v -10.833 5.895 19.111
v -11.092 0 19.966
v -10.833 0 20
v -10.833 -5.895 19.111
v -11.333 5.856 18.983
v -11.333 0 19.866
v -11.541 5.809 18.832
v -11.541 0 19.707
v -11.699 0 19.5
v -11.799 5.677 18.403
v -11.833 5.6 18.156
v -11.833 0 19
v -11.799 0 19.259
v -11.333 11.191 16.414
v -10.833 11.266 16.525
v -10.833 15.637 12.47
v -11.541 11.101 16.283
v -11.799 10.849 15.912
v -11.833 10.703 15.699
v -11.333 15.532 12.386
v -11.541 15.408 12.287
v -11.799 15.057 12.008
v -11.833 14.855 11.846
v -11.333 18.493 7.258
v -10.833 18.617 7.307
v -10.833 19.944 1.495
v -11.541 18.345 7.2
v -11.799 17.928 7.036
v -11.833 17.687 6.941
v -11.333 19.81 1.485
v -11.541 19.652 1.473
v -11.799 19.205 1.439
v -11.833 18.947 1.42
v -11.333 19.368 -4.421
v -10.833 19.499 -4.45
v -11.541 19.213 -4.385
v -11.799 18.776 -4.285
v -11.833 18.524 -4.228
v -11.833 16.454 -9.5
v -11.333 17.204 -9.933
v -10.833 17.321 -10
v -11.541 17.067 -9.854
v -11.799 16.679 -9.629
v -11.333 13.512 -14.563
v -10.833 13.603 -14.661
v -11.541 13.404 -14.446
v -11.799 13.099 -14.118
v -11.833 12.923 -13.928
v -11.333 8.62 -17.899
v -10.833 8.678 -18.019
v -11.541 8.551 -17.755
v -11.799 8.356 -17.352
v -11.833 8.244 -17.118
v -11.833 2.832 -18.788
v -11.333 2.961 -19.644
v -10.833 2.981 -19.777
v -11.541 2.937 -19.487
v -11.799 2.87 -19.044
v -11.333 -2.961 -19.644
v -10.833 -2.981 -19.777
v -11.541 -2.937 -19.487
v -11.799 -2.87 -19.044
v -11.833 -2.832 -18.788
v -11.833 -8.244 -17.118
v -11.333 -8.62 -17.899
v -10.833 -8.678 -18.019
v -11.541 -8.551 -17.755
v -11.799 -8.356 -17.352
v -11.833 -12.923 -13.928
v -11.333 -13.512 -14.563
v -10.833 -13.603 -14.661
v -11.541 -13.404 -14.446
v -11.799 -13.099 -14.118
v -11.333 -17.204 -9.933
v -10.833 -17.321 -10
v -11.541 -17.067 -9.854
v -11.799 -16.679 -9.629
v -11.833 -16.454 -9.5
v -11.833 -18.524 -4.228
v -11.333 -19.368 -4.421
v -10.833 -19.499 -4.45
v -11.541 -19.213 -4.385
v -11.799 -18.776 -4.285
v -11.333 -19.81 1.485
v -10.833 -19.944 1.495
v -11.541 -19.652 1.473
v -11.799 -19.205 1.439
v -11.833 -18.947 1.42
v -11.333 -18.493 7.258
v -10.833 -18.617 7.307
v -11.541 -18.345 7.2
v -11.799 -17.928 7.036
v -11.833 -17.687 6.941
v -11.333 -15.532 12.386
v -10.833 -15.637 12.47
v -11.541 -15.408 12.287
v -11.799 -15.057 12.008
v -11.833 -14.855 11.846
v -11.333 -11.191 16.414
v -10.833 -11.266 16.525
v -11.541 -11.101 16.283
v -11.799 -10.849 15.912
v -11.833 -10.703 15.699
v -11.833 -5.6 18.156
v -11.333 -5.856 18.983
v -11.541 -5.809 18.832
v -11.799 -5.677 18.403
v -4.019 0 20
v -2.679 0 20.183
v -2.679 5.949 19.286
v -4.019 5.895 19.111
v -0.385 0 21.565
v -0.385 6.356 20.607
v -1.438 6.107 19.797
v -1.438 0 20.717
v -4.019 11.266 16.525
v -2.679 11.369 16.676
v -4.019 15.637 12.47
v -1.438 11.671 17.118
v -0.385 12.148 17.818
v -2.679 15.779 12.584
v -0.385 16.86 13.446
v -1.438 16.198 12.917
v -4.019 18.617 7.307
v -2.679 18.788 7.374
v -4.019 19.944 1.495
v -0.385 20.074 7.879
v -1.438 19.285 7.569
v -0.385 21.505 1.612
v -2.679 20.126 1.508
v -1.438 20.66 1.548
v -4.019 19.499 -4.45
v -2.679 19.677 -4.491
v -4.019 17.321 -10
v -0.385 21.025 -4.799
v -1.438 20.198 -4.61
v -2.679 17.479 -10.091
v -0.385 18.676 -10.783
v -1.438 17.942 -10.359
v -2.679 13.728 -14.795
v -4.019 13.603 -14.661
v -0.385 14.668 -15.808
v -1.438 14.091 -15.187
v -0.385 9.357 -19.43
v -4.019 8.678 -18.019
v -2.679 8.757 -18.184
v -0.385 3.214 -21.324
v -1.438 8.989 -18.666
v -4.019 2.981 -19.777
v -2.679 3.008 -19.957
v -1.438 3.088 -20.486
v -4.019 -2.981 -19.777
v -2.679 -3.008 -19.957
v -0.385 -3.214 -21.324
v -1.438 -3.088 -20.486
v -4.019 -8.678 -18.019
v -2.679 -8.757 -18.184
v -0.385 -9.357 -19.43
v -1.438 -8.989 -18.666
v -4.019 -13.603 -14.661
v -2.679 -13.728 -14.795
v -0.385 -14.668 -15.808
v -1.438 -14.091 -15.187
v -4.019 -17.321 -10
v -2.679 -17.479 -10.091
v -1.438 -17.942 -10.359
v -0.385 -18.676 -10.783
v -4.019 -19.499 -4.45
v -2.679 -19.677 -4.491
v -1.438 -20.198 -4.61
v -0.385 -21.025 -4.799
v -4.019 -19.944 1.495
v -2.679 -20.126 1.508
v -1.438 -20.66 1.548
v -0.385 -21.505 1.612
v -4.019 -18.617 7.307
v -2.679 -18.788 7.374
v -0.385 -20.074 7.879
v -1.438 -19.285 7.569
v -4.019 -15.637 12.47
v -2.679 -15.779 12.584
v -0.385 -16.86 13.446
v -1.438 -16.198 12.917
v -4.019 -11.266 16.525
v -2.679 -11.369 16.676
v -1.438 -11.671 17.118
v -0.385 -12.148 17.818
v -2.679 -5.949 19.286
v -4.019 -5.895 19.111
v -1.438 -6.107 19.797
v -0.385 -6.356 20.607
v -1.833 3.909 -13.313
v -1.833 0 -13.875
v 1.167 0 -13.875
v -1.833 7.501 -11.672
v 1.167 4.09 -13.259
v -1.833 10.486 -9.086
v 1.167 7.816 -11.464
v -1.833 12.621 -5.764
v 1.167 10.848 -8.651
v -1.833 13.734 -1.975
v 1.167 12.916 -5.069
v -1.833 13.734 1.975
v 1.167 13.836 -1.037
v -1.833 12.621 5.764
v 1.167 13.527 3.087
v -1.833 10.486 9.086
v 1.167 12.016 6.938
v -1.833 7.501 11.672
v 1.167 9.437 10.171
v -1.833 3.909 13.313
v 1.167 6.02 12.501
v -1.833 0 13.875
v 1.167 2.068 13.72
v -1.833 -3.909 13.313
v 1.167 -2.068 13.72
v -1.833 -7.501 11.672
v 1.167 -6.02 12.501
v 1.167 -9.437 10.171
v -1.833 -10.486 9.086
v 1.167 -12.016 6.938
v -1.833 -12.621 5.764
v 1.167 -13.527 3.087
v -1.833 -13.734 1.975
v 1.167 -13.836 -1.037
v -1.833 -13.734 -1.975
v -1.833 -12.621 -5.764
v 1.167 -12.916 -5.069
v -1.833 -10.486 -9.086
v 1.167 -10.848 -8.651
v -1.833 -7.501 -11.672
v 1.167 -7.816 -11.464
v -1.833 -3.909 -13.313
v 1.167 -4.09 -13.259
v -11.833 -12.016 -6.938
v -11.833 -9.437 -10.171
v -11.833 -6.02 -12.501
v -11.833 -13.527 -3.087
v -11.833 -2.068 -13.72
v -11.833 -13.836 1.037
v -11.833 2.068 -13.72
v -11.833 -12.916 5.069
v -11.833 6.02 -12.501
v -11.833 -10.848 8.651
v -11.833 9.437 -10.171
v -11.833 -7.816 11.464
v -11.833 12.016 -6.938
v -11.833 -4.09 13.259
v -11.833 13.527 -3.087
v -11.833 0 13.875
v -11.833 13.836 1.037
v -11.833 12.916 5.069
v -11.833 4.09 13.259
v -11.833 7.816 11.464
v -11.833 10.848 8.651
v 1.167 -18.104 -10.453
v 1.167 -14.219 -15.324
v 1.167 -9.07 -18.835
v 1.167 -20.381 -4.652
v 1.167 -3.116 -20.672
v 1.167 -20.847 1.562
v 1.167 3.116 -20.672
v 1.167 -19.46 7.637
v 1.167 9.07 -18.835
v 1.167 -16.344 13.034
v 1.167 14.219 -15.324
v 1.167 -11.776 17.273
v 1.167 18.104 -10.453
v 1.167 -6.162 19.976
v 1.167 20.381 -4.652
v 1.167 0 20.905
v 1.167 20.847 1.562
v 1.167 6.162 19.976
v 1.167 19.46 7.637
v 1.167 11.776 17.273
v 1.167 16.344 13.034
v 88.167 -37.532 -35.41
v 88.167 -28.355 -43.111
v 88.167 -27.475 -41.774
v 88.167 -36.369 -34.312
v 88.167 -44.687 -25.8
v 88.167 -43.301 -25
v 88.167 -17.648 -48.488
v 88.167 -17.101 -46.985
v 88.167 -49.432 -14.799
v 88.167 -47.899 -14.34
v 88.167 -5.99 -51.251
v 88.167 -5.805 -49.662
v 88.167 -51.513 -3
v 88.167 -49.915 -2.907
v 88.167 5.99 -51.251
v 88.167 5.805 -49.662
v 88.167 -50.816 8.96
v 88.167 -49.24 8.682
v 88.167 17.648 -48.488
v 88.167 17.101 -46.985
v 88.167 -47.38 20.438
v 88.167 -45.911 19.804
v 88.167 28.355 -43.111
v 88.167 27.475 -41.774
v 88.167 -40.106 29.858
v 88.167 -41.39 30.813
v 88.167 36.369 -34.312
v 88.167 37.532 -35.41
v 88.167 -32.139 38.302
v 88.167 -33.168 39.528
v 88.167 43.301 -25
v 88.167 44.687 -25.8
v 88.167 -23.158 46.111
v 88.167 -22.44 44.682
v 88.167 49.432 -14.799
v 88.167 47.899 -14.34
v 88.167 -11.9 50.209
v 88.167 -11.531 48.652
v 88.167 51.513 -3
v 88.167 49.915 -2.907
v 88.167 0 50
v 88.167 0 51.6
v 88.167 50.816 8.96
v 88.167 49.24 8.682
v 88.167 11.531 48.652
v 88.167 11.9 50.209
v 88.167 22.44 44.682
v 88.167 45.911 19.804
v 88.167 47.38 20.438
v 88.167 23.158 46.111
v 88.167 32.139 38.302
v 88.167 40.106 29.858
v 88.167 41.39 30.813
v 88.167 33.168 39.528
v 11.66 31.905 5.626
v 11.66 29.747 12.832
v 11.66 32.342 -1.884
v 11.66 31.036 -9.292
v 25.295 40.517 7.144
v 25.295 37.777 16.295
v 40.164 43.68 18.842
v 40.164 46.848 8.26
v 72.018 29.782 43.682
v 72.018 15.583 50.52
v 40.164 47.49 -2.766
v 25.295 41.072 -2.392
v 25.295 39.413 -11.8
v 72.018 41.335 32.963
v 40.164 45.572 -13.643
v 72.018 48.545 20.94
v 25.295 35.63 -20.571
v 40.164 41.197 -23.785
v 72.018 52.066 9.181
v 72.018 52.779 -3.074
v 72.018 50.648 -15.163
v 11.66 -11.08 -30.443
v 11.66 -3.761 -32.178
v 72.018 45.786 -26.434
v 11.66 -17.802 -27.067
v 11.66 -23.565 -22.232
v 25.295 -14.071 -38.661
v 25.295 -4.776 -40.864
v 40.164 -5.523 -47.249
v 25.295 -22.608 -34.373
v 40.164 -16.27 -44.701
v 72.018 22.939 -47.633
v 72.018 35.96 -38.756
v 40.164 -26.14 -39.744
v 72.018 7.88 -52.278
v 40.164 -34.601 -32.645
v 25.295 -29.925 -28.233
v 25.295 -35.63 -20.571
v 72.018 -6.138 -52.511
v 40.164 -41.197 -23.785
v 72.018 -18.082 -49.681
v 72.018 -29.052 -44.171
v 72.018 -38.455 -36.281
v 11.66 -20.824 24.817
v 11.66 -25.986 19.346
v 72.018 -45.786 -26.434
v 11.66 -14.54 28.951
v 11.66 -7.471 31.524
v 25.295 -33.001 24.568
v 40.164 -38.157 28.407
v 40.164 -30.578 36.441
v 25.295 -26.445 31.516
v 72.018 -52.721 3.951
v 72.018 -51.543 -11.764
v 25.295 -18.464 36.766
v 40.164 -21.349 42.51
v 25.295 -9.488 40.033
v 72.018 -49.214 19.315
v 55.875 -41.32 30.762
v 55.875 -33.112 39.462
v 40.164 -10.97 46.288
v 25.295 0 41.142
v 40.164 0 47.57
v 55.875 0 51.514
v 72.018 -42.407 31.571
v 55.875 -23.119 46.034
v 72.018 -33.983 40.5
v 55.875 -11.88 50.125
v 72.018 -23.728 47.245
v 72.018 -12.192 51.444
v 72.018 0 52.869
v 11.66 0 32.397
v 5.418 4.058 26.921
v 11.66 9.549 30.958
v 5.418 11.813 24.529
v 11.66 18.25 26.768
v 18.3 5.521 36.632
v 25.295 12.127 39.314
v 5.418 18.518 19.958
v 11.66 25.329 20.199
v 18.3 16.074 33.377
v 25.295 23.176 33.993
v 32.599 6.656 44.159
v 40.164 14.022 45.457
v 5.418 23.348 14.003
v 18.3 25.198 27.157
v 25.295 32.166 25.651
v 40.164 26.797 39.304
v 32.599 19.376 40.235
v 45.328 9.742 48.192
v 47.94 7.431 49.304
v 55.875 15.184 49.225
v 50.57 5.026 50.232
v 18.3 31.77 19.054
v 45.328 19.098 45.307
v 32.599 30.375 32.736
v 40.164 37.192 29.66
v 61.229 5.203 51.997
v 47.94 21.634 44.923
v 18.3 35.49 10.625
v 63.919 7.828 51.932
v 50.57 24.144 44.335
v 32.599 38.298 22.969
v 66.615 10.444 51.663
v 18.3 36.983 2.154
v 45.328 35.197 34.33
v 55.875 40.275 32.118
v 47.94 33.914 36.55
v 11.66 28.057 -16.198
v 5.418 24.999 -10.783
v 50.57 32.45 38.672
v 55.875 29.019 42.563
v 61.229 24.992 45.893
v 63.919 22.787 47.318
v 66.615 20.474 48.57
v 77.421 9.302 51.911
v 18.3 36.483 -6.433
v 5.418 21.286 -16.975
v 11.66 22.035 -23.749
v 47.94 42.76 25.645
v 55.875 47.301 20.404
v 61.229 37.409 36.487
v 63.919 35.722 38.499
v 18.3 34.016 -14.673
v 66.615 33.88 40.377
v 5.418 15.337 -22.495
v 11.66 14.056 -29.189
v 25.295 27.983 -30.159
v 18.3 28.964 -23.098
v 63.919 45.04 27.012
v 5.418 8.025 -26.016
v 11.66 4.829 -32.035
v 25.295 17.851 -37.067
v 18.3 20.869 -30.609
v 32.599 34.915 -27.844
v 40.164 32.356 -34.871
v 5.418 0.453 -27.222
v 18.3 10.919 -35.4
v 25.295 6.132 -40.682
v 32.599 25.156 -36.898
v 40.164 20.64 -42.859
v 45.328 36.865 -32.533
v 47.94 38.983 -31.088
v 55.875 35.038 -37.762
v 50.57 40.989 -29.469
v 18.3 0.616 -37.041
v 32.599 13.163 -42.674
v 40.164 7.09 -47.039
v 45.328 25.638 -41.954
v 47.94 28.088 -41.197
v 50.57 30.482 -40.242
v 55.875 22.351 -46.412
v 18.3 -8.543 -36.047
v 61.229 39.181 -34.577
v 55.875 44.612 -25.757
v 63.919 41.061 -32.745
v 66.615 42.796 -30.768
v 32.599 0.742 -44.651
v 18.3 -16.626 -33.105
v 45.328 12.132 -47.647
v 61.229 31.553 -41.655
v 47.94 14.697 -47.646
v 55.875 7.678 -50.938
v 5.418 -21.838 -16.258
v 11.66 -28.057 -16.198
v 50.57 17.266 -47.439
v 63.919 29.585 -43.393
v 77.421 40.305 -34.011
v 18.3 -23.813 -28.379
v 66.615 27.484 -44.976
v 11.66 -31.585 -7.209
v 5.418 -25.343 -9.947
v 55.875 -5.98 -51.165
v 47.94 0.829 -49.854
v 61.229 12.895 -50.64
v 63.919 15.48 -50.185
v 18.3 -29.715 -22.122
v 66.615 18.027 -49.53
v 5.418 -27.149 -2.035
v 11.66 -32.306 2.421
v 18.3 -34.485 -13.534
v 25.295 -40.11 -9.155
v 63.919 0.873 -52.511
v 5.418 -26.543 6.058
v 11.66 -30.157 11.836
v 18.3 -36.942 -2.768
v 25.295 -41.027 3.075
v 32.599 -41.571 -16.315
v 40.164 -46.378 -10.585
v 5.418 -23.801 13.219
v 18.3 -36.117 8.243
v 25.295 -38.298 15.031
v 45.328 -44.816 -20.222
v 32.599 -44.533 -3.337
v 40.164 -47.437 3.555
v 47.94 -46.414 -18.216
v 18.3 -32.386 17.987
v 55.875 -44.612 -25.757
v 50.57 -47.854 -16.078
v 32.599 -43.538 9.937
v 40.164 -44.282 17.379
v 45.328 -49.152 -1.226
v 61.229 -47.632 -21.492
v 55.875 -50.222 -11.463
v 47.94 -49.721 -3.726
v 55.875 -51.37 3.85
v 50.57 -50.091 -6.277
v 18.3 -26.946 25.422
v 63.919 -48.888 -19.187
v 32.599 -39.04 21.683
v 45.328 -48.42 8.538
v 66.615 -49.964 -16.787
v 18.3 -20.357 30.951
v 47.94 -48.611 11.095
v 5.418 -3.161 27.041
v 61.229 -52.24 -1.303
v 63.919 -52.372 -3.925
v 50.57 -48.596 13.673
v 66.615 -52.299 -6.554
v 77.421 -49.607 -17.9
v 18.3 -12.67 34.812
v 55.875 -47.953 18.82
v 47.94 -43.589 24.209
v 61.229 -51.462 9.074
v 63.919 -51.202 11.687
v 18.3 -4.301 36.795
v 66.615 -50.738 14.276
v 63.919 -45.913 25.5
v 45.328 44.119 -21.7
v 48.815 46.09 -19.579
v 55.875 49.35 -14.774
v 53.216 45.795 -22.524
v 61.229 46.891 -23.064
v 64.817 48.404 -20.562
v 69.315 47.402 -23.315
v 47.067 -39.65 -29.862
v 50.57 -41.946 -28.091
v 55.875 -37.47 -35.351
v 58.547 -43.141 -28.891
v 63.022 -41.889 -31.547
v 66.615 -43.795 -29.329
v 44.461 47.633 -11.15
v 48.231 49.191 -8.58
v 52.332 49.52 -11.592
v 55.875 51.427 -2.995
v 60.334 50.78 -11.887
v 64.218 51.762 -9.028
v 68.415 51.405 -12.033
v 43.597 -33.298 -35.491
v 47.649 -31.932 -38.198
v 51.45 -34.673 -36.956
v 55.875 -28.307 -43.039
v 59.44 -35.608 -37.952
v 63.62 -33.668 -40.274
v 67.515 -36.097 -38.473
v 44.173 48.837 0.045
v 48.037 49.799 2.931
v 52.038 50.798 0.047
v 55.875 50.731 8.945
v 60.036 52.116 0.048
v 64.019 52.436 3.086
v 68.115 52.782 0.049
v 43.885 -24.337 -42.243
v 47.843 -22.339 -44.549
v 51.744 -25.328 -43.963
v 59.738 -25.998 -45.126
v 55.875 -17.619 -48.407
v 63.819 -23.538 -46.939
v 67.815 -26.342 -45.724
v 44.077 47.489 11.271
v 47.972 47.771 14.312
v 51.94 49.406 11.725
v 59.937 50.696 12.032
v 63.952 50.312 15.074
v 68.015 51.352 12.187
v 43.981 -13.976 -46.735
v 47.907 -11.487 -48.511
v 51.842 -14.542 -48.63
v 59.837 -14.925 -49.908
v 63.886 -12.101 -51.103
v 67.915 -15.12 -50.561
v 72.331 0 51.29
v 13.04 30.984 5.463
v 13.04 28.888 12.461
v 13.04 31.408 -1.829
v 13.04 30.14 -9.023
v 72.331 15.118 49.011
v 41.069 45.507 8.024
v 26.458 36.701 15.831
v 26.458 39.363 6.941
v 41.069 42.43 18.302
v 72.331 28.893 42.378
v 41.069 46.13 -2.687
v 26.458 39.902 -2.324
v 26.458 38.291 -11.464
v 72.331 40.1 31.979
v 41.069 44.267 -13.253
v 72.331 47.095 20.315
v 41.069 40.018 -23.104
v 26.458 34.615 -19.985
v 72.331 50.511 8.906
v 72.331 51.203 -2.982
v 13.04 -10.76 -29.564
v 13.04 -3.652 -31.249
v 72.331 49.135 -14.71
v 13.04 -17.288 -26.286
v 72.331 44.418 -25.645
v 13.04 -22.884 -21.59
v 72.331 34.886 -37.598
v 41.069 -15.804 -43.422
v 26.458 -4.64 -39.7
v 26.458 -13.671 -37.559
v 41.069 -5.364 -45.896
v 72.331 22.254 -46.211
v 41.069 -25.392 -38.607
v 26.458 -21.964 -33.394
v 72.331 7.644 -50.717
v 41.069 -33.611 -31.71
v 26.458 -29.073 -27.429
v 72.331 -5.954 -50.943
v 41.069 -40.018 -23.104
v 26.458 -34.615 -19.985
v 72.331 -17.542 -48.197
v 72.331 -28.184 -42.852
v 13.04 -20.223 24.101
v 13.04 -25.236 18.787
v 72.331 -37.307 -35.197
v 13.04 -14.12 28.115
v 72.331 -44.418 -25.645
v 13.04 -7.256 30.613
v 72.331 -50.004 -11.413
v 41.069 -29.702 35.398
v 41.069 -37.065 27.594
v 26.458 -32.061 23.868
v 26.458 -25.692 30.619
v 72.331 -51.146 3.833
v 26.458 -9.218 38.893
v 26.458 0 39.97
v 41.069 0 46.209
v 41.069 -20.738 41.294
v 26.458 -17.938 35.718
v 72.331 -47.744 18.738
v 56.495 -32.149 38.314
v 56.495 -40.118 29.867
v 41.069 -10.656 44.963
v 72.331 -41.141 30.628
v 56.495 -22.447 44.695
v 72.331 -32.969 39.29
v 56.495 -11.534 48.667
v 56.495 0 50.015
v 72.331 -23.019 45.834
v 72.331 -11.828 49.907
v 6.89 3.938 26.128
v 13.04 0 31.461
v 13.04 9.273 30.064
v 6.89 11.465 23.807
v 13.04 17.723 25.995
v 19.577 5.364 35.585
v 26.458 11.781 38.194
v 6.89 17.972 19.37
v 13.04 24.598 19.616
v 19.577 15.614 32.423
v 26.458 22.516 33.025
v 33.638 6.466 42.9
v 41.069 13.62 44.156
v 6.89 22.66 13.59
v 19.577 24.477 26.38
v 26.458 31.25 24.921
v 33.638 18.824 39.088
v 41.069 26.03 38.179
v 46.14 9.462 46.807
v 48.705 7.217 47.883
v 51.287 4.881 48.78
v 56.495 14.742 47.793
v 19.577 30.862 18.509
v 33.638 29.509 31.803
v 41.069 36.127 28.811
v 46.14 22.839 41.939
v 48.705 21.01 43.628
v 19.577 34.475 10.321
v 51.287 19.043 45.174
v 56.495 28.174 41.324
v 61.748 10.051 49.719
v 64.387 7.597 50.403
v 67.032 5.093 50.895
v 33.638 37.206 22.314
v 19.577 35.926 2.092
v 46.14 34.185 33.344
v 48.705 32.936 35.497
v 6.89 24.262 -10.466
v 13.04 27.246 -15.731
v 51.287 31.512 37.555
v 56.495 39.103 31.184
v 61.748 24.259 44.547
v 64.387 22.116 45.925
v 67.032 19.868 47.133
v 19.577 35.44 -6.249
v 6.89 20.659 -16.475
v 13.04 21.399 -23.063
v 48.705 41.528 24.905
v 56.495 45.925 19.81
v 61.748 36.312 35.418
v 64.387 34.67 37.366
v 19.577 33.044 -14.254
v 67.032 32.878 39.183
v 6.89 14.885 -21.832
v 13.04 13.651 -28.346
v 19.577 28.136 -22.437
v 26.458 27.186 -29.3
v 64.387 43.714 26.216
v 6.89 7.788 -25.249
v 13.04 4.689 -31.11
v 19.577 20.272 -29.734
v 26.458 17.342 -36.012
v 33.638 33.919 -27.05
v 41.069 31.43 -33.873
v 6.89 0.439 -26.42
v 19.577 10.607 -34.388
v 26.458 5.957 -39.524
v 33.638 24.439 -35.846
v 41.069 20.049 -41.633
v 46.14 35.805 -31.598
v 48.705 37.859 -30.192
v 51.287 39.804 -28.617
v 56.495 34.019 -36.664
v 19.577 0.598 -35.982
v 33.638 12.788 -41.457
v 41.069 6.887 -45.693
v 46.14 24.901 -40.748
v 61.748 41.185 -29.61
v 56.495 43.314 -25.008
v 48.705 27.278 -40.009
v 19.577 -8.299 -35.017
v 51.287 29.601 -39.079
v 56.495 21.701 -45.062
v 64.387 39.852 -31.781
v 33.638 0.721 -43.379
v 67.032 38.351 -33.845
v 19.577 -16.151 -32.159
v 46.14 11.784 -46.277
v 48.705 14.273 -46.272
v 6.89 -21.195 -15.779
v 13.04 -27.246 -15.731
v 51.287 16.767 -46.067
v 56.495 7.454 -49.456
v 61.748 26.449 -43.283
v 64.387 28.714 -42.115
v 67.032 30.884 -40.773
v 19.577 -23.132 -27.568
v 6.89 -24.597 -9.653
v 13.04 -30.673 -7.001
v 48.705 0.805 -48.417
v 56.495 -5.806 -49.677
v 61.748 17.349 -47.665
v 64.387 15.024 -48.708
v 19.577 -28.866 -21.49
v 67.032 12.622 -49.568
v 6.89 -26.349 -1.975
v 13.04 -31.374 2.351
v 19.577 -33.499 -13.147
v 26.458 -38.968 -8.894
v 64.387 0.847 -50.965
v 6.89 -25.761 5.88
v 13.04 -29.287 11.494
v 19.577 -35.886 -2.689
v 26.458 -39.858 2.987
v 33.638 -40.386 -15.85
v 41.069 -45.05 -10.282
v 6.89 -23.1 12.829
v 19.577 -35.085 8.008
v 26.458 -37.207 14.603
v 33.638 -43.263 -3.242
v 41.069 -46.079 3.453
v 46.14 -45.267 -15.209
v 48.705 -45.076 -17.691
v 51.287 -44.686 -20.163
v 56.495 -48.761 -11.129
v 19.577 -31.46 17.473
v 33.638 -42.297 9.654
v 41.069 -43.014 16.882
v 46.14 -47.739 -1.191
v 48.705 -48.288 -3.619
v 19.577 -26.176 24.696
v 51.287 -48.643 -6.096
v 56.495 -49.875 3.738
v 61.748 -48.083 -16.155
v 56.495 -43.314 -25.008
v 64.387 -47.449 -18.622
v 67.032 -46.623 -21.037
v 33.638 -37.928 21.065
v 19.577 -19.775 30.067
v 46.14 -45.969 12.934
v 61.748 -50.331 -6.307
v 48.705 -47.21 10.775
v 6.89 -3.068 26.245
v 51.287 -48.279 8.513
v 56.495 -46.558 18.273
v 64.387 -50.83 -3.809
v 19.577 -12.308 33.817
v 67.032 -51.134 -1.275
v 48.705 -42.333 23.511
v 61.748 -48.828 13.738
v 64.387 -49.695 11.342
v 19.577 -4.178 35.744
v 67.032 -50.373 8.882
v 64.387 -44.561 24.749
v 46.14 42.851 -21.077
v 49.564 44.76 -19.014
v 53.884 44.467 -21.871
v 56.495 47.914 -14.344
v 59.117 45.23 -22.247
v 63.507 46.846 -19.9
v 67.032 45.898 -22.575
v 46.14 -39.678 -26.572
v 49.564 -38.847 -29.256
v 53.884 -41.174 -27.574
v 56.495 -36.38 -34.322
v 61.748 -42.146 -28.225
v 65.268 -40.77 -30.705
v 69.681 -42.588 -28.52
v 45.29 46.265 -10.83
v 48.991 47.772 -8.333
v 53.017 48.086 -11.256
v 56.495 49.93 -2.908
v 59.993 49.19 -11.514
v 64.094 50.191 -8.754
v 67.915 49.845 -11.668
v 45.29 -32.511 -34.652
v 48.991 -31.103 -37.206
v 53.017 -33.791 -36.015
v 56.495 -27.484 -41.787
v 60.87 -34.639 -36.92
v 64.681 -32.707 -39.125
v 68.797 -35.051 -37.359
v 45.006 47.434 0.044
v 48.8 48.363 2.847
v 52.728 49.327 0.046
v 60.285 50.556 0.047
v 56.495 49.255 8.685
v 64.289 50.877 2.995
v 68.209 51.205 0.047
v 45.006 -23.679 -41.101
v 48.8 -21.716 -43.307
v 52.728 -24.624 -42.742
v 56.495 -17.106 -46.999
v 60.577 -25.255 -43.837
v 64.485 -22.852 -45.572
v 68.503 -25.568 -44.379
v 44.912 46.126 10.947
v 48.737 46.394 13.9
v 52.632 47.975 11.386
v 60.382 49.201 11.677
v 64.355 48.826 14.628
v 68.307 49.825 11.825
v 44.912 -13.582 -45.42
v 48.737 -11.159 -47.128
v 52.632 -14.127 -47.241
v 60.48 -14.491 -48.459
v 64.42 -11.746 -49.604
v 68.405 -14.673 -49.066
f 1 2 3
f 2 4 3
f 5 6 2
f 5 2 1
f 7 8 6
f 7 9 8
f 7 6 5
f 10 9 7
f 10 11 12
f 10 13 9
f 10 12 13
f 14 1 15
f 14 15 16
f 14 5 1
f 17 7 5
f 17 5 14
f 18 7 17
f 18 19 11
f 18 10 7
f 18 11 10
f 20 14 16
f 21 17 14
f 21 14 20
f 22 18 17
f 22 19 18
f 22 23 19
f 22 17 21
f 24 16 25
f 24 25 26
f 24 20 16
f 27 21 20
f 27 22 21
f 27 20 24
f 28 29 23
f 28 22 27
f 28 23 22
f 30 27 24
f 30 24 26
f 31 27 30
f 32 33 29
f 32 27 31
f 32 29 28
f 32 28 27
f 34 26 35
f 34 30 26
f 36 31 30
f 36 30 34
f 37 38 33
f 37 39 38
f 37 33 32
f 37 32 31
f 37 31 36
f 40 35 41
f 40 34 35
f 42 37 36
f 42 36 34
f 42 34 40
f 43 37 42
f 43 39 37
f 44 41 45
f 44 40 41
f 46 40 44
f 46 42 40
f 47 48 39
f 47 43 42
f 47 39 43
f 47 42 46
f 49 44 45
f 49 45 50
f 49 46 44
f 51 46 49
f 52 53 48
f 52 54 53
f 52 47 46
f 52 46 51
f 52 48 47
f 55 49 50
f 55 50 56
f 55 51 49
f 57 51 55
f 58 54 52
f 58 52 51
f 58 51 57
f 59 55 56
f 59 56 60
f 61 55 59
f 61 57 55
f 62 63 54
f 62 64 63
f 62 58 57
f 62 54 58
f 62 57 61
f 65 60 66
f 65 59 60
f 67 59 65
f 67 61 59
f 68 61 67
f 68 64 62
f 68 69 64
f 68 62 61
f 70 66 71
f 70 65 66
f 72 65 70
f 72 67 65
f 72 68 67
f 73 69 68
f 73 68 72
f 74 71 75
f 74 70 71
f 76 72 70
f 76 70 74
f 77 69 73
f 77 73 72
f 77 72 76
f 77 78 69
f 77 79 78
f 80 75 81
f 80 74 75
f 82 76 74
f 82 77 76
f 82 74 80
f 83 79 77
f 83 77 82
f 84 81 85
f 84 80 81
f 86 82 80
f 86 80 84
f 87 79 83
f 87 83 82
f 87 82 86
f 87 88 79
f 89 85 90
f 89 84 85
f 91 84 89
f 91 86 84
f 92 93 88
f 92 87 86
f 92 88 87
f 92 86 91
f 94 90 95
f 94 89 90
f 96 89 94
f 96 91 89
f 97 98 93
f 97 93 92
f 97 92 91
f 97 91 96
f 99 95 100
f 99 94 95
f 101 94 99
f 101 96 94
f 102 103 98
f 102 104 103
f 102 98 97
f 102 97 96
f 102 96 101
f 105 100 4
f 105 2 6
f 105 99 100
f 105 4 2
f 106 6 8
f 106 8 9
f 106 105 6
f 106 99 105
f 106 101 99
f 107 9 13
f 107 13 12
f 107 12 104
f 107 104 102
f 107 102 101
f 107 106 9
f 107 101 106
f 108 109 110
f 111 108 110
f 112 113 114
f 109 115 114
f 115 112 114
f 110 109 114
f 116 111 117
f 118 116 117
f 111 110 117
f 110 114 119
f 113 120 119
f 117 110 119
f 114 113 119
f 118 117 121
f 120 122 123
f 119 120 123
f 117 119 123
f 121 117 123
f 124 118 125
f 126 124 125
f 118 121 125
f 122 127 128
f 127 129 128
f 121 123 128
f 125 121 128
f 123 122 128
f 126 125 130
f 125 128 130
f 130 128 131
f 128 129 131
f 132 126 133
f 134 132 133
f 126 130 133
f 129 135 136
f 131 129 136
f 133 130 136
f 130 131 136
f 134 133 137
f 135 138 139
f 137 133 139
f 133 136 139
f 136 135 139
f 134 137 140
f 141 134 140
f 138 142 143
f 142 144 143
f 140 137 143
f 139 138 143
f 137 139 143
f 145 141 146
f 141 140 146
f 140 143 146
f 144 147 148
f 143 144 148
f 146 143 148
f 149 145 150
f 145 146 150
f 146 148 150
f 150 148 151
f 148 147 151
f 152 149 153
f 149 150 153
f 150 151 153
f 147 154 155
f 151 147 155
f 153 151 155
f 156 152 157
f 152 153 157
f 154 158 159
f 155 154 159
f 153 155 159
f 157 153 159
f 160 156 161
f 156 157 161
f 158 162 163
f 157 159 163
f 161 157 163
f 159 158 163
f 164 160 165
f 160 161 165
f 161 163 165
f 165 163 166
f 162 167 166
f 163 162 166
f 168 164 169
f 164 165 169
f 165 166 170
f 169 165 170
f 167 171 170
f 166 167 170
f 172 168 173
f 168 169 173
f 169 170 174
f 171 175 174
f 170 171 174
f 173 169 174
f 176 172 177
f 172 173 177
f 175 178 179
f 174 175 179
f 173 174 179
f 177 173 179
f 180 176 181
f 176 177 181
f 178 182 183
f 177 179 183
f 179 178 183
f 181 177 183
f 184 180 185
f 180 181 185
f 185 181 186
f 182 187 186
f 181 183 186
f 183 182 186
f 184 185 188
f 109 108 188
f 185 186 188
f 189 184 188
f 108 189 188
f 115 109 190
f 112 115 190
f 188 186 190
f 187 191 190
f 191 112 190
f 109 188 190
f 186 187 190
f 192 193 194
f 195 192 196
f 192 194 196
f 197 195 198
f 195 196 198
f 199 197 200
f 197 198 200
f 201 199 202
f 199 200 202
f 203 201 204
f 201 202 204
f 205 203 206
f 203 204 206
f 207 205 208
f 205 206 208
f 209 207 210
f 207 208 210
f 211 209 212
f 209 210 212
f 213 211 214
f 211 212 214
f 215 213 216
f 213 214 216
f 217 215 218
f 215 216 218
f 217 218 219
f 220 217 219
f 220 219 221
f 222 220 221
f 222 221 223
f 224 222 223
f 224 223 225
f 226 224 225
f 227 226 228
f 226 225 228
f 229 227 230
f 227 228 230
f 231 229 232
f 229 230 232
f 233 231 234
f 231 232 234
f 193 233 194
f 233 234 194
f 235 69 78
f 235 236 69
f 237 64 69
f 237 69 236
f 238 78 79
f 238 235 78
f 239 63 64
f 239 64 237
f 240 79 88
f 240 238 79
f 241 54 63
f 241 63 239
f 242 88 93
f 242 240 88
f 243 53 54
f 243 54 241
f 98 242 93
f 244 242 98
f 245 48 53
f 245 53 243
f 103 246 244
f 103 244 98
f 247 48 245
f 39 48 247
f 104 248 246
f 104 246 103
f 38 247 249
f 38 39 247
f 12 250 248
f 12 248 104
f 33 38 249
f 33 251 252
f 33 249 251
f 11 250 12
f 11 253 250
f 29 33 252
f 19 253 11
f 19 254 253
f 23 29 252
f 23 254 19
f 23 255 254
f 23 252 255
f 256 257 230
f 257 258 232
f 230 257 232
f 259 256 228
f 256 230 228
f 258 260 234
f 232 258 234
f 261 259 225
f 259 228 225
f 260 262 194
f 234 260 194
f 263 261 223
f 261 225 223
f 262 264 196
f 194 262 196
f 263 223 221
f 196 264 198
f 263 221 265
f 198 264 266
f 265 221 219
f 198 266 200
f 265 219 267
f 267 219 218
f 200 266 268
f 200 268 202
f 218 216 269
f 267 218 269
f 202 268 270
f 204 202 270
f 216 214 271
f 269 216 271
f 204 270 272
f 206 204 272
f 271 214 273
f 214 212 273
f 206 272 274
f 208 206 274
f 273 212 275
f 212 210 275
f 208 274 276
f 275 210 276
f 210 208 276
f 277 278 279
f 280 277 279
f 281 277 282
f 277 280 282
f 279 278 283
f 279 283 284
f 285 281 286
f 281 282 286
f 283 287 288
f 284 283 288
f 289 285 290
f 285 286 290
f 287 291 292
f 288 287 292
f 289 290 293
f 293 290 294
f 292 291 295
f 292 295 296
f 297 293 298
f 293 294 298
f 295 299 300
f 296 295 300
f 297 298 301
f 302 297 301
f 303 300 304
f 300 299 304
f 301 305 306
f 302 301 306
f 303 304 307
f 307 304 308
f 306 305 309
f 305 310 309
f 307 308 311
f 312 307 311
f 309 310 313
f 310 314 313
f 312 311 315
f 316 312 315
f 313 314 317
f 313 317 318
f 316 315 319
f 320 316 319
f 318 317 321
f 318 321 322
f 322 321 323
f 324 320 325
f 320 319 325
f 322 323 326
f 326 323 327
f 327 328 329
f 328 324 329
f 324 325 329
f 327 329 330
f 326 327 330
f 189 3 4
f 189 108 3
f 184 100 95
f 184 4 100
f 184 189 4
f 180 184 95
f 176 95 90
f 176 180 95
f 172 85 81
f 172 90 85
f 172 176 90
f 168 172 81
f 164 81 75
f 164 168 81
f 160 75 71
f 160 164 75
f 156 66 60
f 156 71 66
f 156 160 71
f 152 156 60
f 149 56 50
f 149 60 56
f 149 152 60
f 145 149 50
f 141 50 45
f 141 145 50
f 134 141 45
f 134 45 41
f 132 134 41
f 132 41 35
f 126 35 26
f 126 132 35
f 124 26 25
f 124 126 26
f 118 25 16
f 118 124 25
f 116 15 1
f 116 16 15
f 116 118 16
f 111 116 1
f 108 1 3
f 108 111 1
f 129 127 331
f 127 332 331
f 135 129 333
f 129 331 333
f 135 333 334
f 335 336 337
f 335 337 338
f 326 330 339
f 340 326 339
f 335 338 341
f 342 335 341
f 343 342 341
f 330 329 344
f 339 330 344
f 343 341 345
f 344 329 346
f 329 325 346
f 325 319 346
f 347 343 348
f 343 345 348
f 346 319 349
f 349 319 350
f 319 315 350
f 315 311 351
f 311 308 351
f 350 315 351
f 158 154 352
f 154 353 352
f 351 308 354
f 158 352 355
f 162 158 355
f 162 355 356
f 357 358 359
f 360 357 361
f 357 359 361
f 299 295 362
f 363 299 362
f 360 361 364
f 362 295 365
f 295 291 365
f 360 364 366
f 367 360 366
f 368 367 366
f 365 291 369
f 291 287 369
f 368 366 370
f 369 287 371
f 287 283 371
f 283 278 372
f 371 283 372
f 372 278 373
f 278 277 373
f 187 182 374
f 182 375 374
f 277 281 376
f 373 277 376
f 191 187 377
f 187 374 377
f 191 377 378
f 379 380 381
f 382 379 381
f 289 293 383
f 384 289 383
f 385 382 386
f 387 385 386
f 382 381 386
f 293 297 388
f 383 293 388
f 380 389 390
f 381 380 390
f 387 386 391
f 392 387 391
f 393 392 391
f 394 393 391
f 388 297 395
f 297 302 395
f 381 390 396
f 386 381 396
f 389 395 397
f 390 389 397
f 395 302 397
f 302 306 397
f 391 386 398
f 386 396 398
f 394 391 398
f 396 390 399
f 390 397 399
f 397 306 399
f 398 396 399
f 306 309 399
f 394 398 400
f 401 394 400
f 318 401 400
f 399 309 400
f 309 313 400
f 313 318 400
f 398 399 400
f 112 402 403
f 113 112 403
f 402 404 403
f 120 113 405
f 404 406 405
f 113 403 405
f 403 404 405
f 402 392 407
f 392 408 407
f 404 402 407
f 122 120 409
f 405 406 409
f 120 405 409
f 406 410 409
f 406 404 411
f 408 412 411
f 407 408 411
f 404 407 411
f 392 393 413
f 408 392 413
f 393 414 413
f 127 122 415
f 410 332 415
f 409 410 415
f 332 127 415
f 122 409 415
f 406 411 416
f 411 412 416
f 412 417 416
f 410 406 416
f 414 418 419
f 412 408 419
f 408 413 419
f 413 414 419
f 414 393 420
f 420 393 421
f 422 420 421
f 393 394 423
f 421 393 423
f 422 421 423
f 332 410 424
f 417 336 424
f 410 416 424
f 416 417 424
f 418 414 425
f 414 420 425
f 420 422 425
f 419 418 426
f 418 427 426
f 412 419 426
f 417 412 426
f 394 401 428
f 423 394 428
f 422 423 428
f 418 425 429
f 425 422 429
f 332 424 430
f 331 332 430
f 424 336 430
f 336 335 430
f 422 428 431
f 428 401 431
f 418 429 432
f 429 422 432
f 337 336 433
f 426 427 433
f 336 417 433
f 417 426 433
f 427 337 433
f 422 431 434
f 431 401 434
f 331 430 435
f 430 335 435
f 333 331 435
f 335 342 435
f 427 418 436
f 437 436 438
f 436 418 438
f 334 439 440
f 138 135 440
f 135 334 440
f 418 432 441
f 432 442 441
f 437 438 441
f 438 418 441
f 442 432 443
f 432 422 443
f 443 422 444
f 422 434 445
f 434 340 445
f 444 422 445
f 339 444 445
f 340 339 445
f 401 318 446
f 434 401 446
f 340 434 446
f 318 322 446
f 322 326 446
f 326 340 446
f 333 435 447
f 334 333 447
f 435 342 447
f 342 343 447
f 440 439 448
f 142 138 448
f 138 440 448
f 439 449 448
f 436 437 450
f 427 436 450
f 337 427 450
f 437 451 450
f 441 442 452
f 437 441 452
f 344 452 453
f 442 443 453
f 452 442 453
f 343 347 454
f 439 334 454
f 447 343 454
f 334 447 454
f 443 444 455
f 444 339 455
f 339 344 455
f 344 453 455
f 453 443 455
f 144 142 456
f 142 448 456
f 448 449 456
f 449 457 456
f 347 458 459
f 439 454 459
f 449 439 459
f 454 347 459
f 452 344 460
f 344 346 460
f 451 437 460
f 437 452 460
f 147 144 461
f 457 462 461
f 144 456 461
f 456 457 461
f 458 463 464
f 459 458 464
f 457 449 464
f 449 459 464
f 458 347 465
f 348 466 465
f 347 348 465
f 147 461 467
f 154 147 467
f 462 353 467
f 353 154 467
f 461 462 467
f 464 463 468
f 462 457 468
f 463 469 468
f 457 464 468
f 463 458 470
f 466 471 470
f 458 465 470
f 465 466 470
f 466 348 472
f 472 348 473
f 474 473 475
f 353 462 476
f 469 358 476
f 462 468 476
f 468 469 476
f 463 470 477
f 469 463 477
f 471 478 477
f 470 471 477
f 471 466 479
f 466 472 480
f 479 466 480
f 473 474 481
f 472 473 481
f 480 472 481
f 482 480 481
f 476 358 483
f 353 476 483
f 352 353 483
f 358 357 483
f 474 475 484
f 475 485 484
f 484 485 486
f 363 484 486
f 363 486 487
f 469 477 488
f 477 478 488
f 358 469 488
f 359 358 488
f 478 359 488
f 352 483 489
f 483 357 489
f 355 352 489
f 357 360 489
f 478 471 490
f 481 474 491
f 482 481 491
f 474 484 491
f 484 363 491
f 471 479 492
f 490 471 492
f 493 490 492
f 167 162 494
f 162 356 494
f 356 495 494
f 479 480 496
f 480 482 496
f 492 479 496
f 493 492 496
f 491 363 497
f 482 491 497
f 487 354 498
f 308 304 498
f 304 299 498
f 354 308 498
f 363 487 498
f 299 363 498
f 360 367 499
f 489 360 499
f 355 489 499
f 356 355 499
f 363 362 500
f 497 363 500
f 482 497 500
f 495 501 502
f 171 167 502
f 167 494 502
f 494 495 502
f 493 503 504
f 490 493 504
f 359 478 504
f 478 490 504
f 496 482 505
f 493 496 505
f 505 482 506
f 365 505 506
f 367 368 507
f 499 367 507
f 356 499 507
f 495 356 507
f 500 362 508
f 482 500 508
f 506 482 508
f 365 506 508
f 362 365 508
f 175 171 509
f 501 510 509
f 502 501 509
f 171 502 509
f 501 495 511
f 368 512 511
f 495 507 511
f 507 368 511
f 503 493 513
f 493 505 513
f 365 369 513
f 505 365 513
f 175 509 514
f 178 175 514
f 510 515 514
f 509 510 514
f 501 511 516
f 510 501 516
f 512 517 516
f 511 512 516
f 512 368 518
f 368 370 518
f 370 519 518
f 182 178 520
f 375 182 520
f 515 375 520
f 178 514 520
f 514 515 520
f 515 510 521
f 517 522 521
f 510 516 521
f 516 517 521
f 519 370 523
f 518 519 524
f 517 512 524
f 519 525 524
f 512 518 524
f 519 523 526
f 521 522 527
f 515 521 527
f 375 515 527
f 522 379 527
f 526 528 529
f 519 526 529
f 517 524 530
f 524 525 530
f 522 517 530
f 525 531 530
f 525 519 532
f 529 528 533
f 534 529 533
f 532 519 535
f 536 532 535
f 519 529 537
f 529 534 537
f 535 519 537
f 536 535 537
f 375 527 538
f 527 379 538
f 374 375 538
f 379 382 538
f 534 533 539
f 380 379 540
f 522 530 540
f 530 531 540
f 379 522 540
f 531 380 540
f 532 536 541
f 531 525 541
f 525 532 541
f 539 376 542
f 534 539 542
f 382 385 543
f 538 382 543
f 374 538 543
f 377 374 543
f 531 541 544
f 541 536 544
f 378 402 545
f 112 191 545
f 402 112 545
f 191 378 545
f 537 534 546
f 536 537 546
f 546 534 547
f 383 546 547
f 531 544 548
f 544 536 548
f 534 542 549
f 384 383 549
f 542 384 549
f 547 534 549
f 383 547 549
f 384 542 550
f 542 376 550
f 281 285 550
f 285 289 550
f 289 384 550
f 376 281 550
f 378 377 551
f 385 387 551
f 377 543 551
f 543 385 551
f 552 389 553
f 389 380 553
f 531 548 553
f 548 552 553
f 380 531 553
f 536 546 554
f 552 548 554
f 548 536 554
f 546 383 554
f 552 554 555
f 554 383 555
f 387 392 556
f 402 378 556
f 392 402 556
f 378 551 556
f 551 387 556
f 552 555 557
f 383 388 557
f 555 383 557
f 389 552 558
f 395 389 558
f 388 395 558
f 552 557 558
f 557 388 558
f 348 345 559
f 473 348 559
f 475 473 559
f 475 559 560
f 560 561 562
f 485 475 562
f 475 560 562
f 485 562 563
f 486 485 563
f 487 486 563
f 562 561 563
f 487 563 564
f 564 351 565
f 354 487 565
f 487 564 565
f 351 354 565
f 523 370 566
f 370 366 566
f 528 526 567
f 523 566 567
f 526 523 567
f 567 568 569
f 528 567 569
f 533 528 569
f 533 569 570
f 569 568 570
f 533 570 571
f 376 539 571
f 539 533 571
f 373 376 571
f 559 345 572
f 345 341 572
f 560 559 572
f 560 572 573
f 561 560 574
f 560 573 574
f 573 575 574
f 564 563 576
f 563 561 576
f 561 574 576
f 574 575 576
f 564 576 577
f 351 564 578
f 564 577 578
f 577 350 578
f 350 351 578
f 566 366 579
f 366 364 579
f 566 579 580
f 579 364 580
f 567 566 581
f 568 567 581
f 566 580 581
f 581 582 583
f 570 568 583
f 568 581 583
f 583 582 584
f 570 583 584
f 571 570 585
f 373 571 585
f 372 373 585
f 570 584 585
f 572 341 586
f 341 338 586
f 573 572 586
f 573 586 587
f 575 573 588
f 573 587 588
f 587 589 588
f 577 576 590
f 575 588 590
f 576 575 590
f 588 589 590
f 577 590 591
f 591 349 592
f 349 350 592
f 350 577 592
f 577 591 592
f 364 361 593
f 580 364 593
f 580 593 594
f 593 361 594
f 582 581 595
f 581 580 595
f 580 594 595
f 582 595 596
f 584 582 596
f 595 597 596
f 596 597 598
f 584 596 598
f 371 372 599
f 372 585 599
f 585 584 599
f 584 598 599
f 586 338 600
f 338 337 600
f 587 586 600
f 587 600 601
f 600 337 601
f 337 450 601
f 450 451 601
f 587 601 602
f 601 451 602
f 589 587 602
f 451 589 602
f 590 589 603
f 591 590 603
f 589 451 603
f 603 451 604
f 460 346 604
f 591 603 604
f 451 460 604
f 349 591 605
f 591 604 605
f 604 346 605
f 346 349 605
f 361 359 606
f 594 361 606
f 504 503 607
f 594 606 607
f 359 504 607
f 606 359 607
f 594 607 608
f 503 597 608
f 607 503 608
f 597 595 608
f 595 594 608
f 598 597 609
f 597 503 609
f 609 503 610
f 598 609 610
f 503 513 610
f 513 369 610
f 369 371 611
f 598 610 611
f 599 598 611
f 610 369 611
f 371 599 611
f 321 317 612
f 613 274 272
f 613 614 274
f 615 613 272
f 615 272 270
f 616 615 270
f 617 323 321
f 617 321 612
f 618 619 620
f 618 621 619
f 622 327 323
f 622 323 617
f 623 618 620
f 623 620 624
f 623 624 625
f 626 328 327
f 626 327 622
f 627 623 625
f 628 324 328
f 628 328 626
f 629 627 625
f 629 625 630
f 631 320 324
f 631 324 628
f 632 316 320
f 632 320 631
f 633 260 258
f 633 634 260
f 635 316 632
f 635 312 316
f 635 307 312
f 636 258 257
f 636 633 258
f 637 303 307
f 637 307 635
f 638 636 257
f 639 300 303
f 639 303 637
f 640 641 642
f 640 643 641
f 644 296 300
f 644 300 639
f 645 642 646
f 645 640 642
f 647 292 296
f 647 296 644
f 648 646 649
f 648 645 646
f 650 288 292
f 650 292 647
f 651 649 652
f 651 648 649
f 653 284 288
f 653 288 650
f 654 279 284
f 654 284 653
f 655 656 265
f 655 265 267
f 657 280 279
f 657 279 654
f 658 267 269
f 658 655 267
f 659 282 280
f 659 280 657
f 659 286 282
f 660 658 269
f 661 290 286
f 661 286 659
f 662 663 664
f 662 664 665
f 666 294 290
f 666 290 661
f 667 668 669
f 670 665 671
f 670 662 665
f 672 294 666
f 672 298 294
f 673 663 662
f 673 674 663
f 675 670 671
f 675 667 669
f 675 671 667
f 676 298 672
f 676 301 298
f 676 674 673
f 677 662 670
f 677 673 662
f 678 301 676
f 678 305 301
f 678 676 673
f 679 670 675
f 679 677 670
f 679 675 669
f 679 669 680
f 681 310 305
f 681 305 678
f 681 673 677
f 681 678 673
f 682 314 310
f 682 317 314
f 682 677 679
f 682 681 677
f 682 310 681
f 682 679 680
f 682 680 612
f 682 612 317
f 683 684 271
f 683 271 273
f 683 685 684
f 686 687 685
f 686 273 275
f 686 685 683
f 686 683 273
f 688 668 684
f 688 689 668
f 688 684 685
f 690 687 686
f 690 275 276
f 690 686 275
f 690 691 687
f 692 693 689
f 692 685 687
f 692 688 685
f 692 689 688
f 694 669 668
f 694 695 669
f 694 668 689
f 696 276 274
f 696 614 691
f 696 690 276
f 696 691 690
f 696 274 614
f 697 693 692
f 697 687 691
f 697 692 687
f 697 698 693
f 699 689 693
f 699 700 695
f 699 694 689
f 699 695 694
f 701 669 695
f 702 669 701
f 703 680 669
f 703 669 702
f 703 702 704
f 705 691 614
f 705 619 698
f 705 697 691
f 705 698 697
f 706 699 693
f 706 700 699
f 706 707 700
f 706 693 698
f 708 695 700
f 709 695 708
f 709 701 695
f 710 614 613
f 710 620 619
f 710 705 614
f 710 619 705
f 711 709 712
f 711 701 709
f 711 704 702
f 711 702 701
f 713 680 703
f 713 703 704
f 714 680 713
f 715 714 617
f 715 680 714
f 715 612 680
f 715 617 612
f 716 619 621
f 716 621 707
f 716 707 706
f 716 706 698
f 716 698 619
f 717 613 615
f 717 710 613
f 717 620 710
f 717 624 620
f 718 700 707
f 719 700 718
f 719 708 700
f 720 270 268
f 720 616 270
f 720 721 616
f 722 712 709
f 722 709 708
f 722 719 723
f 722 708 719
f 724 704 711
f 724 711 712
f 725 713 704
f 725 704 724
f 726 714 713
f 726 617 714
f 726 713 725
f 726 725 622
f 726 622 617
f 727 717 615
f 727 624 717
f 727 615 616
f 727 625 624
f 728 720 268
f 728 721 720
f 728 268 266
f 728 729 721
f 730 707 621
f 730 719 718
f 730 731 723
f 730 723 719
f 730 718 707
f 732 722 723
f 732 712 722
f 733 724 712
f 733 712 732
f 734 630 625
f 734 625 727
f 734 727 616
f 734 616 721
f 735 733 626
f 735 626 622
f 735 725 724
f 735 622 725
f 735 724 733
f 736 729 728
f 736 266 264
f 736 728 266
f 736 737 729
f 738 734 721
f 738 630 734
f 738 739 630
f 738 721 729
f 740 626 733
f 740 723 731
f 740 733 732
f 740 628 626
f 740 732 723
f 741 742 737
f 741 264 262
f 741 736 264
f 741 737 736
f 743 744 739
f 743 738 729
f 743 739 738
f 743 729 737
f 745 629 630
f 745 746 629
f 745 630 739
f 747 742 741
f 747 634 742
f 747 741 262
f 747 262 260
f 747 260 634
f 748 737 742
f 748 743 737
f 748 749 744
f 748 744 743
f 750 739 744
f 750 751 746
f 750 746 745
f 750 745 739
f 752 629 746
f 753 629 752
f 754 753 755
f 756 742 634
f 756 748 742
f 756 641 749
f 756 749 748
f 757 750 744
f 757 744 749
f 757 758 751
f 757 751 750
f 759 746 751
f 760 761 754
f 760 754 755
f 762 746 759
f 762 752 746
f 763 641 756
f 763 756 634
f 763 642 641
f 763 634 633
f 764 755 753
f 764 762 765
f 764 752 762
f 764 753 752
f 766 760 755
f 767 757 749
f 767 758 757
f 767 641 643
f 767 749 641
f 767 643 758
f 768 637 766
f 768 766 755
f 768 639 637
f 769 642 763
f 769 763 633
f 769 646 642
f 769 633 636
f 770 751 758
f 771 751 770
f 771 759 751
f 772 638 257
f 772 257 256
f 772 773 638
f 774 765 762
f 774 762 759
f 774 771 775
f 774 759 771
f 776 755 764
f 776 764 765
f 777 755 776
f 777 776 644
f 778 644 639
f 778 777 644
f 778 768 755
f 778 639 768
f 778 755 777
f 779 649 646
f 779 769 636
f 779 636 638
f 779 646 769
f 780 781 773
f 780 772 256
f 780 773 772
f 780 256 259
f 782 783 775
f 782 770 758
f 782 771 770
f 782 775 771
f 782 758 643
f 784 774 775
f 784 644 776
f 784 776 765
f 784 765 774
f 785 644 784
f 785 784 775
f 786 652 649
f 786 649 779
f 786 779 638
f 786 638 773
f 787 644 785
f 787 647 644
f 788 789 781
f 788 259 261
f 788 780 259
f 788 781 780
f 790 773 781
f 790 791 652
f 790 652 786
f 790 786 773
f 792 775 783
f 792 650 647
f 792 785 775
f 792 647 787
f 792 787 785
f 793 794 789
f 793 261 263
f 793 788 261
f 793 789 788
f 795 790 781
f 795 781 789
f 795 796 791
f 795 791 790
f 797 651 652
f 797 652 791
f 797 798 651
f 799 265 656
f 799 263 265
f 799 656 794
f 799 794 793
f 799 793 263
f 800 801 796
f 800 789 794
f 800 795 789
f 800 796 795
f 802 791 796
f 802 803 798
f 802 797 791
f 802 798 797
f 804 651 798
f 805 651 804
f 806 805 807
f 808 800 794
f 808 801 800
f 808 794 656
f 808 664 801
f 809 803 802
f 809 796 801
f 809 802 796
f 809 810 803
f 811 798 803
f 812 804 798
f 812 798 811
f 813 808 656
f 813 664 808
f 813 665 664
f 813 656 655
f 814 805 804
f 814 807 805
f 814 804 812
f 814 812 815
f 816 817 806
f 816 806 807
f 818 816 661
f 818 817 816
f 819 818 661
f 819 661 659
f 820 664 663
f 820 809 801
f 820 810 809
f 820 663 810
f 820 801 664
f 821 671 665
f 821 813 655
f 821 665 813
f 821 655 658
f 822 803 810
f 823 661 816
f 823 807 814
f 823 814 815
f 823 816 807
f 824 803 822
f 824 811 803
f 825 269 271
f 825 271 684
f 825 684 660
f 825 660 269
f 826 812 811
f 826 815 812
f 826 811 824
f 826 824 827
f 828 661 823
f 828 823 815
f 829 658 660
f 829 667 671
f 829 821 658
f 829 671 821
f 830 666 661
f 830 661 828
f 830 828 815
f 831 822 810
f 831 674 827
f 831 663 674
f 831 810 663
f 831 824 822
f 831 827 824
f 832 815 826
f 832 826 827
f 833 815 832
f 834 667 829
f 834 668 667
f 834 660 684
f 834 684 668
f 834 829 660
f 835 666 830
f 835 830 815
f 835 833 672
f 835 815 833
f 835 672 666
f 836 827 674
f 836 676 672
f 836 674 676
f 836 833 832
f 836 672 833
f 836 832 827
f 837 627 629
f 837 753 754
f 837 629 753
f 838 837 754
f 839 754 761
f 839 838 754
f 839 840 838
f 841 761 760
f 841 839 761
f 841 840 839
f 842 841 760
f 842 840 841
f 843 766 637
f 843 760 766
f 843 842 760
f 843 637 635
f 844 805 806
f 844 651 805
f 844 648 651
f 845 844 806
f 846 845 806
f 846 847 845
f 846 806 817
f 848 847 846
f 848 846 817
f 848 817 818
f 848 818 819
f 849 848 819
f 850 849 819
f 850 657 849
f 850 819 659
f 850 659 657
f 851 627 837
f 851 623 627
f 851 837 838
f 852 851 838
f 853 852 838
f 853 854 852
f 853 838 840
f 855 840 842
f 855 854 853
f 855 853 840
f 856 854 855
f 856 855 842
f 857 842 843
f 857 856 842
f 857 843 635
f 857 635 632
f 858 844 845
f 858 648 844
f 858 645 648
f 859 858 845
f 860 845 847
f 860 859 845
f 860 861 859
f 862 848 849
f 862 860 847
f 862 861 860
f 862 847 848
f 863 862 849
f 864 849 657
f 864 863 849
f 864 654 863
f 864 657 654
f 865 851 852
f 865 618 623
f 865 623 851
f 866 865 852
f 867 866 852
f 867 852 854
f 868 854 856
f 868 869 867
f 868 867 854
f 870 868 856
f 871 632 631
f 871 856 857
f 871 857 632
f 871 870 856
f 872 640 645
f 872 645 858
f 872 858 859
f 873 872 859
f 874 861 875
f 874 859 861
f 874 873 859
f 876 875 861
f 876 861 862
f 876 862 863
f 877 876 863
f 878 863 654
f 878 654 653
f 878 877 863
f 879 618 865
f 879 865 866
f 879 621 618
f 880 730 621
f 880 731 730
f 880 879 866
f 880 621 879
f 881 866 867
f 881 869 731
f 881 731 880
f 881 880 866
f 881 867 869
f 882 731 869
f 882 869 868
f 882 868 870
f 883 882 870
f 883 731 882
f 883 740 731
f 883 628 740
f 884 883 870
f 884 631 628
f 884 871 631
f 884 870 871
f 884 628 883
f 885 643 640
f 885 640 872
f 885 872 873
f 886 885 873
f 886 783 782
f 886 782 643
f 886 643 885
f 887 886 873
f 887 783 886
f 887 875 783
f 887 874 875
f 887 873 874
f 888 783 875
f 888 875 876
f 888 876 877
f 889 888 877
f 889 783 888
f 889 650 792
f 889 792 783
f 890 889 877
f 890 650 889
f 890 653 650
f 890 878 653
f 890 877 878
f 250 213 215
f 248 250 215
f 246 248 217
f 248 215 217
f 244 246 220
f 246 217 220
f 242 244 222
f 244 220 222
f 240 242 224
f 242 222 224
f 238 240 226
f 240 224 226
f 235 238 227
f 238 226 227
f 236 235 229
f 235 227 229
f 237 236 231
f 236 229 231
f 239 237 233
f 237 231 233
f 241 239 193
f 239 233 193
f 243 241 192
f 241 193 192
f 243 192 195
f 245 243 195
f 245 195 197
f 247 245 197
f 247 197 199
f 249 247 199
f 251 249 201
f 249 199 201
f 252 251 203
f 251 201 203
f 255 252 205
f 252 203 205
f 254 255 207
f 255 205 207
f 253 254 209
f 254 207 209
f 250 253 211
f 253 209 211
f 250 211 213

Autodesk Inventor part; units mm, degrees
ref_plane "YZ Plane" through (0, 0, 0) normal (1, 0, 0) x (0, 1, 0)
ref_plane "XZ Plane" through (0, 0, 0) normal (0, 1, 0) x (-1, 0, 0)
ref_plane "XY Plane" through (0, 0, 0) normal (0, 0, 1) x (1, 0, 0)
sketch "Sketch1" plane through (0, 0, 0) normal (0, 1, 0) x (-1, 0, 0)
  line L0 (1.8334, 0) -> (1.8334, 20)
  line L1 (-88.1666, 51.6) -> (-88.1666, 50)
  line L2 (-1.1666, 20.905) -> (-1.1666, 0)
  line L3 (-1.1666, 0) -> (1.8334, 0)
  arc A0 (-1.1666, 20.905) -> (-88.1666, 50) centre (-72.2845, -47.1307) ccw
  arc A1 (1.8334, 20) -> (-88.1666, 51.6) centre (-72.2845, -47.1307) ccw
  point P0 (0, 0)
  point P1 (-1.1666, 10.4525)
  dimension "d0" = 3
  dimension "d2" = 1.6
  dimension "d3" = 20
  dimension "d4" = 90
  dimension "d5" = 50
  dimension "d10" = 100
revolve "Revolution1" add sketch "Sketch1" angle 360 about axis through (1.1666, 0, 0) along (-1, 0, 0)
sketch "Sketch2" plane through (1.1666, 0, 0) normal (1, 0, 0) x (0, 0, -1)
  circle A0 centre (0, 0) radius 13.875
  point P0 (0, 0)
  dimension "d7" = 27.75
extrude "Extrusion1" cut sketch "Sketch2" against normal through all
sketch "Sketch3" plane through (-1.8334, 0, 0) normal (-1, 0, 0) x (0, 0, 1)
  circle A0 centre (0, 0) radius 13.875 projected
  circle A1 centre (0, 0) radius 20 projected
  point P0 (0, 0)
extrude "Extrusion2" add sketch "Sketch3" along normal blind 10
fillet "Fillet1" radius 5 1 edges at (-1.8334, 0, -20)
fillet "Fillet2" radius 1 1 edges at (-11.8334, 0, -20)
properties part number "Screen"
